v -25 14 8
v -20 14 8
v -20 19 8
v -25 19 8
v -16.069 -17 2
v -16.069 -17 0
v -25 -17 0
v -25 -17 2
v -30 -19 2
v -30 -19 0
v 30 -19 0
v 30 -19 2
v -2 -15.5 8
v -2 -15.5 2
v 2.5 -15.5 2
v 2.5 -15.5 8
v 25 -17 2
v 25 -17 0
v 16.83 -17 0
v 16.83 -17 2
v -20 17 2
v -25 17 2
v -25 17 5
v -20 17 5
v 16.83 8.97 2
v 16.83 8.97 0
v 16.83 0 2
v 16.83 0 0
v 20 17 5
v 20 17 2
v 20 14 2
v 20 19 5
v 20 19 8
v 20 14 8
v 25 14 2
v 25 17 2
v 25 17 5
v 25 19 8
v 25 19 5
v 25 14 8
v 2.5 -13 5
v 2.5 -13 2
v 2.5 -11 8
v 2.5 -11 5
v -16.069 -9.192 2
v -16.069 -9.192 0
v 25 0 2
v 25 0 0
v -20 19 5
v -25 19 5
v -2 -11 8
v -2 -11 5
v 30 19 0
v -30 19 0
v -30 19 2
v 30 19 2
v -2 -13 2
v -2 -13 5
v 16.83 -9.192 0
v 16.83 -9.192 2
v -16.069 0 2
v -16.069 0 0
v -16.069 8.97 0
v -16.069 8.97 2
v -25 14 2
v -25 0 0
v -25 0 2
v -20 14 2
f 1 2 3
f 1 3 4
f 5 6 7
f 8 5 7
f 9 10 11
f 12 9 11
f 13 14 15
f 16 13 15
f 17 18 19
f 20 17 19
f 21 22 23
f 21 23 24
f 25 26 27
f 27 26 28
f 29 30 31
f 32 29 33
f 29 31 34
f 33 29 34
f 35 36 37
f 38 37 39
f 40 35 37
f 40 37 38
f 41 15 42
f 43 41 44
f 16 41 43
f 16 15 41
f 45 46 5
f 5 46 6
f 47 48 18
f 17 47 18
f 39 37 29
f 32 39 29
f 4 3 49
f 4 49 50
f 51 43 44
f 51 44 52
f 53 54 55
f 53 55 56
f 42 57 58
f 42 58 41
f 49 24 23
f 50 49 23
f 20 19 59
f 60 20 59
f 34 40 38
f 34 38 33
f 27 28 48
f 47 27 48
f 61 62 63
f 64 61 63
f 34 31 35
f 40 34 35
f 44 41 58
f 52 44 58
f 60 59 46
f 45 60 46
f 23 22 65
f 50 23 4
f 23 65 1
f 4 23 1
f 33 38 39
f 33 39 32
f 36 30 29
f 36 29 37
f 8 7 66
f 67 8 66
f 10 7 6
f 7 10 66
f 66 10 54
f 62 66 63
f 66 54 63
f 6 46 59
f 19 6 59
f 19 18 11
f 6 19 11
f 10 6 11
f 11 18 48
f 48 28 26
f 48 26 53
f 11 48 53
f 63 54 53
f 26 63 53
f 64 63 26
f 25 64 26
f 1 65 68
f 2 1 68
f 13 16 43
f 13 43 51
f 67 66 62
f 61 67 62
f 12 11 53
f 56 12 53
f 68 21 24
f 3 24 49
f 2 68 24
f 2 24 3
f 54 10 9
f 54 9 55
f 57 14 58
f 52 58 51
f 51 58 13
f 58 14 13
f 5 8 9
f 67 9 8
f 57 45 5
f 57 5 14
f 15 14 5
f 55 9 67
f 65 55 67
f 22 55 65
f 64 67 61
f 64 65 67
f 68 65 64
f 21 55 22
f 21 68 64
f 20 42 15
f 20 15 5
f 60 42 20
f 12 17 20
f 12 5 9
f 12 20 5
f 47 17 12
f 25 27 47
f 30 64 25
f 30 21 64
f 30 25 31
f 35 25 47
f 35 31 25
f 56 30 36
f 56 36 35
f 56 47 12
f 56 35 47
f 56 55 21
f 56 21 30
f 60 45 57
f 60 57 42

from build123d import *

# Parameters (mm, degrees)
F0_W     = 60
F0_H     = 38
F0_W_2   = 4.5
F0_H_2   = 2.5
F0_W_3   = 5
F0_H_3   = 3
F1_DEPTH = 2
F2_DEPTH = 8
F3_W     = 5
F3_H     = 3
F4_DEPTH = 2
F5_W     = 5
F5_H     = 3
F6_DEPTH = 2
F7_DEPTH = 8
F8_W     = 4.5
F8_H     = 3
F9_DEPTH = 2


# Not quite as in the source:
# - a feature names something its author has since deleted; it is built from what else it names


with BuildPart() as f1:
    # F0 (on Top) → F1 (new body)
    with BuildSketch(Plane.XY):
        Rectangle(F0_W, F0_H)
        with Locations((0.25, -14.25)):
            Rectangle(F0_W_2, F0_H_2, mode=Mode.SUBTRACT)
        Polygon((-16.0694369525, 0), (-16.0694369525, 8.9702934623), (16.8300806135, 8.9702934623), (16.8300806135, 0), (25, 0), (25, -17), (16.8300806135, -17), (16.8300806135, -9.1921526343), (-16.0694369525, -9.1921526343), (-16.0694369525, -17), (-25, -17), (-25, 0), align=None, mode=Mode.SUBTRACT)
        with Locations((-22.5, 15.5)):
            Rectangle(F0_W_3, F0_H_3, mode=Mode.SUBTRACT)
        with Locations((22.5, 15.5)):
            Rectangle(F0_W_3, F0_H_3, mode=Mode.SUBTRACT)
    extrude(amount=F1_DEPTH)

    # F0 (on Top) → F2 (join)
    with BuildSketch(Plane.XY):
        with Locations((22.5, 15.5)):
            Rectangle(F0_W_3, F0_H_3)
        with Locations((-22.5, 15.5)):
            Rectangle(F0_W_3, F0_H_3)
    extrude(amount=F2_DEPTH)

    # F3 (on face) → F4 (join)
    with BuildSketch(Plane(origin=(0, 17, 0), x_dir=(-1, 0, 0), z_dir=(0, 1, 0))):
        with Locations((22.5, 6.5)):
            Rectangle(F3_W, F3_H)
    extrude(amount=F4_DEPTH)

    # F5 (on face) → F6 (join)
    with BuildSketch(Plane(origin=(0, 17, 0), x_dir=(-1, 0, 0), z_dir=(0, 1, 0))):
        with Locations((-22.5, 6.5)):
            Rectangle(F5_W, F5_H)
    extrude(amount=F6_DEPTH)

    # F0 (on Top) → F7 (join)
    with BuildSketch(Plane.XY):
        with Locations((0.25, -14.25)):
            Rectangle(F0_W_2, F0_H_2)
    extrude(amount=F7_DEPTH)

    # F8 (on face) → F9 (join)
    with BuildSketch(Plane(origin=(0, -13, 0), x_dir=(-1, 0, 0), z_dir=(0, 1, 0))):
        with Locations((-0.25, 6.5)):
            Rectangle(F8_W, F8_H)
    extrude(amount=F9_DEPTH)


solid = f1.part
